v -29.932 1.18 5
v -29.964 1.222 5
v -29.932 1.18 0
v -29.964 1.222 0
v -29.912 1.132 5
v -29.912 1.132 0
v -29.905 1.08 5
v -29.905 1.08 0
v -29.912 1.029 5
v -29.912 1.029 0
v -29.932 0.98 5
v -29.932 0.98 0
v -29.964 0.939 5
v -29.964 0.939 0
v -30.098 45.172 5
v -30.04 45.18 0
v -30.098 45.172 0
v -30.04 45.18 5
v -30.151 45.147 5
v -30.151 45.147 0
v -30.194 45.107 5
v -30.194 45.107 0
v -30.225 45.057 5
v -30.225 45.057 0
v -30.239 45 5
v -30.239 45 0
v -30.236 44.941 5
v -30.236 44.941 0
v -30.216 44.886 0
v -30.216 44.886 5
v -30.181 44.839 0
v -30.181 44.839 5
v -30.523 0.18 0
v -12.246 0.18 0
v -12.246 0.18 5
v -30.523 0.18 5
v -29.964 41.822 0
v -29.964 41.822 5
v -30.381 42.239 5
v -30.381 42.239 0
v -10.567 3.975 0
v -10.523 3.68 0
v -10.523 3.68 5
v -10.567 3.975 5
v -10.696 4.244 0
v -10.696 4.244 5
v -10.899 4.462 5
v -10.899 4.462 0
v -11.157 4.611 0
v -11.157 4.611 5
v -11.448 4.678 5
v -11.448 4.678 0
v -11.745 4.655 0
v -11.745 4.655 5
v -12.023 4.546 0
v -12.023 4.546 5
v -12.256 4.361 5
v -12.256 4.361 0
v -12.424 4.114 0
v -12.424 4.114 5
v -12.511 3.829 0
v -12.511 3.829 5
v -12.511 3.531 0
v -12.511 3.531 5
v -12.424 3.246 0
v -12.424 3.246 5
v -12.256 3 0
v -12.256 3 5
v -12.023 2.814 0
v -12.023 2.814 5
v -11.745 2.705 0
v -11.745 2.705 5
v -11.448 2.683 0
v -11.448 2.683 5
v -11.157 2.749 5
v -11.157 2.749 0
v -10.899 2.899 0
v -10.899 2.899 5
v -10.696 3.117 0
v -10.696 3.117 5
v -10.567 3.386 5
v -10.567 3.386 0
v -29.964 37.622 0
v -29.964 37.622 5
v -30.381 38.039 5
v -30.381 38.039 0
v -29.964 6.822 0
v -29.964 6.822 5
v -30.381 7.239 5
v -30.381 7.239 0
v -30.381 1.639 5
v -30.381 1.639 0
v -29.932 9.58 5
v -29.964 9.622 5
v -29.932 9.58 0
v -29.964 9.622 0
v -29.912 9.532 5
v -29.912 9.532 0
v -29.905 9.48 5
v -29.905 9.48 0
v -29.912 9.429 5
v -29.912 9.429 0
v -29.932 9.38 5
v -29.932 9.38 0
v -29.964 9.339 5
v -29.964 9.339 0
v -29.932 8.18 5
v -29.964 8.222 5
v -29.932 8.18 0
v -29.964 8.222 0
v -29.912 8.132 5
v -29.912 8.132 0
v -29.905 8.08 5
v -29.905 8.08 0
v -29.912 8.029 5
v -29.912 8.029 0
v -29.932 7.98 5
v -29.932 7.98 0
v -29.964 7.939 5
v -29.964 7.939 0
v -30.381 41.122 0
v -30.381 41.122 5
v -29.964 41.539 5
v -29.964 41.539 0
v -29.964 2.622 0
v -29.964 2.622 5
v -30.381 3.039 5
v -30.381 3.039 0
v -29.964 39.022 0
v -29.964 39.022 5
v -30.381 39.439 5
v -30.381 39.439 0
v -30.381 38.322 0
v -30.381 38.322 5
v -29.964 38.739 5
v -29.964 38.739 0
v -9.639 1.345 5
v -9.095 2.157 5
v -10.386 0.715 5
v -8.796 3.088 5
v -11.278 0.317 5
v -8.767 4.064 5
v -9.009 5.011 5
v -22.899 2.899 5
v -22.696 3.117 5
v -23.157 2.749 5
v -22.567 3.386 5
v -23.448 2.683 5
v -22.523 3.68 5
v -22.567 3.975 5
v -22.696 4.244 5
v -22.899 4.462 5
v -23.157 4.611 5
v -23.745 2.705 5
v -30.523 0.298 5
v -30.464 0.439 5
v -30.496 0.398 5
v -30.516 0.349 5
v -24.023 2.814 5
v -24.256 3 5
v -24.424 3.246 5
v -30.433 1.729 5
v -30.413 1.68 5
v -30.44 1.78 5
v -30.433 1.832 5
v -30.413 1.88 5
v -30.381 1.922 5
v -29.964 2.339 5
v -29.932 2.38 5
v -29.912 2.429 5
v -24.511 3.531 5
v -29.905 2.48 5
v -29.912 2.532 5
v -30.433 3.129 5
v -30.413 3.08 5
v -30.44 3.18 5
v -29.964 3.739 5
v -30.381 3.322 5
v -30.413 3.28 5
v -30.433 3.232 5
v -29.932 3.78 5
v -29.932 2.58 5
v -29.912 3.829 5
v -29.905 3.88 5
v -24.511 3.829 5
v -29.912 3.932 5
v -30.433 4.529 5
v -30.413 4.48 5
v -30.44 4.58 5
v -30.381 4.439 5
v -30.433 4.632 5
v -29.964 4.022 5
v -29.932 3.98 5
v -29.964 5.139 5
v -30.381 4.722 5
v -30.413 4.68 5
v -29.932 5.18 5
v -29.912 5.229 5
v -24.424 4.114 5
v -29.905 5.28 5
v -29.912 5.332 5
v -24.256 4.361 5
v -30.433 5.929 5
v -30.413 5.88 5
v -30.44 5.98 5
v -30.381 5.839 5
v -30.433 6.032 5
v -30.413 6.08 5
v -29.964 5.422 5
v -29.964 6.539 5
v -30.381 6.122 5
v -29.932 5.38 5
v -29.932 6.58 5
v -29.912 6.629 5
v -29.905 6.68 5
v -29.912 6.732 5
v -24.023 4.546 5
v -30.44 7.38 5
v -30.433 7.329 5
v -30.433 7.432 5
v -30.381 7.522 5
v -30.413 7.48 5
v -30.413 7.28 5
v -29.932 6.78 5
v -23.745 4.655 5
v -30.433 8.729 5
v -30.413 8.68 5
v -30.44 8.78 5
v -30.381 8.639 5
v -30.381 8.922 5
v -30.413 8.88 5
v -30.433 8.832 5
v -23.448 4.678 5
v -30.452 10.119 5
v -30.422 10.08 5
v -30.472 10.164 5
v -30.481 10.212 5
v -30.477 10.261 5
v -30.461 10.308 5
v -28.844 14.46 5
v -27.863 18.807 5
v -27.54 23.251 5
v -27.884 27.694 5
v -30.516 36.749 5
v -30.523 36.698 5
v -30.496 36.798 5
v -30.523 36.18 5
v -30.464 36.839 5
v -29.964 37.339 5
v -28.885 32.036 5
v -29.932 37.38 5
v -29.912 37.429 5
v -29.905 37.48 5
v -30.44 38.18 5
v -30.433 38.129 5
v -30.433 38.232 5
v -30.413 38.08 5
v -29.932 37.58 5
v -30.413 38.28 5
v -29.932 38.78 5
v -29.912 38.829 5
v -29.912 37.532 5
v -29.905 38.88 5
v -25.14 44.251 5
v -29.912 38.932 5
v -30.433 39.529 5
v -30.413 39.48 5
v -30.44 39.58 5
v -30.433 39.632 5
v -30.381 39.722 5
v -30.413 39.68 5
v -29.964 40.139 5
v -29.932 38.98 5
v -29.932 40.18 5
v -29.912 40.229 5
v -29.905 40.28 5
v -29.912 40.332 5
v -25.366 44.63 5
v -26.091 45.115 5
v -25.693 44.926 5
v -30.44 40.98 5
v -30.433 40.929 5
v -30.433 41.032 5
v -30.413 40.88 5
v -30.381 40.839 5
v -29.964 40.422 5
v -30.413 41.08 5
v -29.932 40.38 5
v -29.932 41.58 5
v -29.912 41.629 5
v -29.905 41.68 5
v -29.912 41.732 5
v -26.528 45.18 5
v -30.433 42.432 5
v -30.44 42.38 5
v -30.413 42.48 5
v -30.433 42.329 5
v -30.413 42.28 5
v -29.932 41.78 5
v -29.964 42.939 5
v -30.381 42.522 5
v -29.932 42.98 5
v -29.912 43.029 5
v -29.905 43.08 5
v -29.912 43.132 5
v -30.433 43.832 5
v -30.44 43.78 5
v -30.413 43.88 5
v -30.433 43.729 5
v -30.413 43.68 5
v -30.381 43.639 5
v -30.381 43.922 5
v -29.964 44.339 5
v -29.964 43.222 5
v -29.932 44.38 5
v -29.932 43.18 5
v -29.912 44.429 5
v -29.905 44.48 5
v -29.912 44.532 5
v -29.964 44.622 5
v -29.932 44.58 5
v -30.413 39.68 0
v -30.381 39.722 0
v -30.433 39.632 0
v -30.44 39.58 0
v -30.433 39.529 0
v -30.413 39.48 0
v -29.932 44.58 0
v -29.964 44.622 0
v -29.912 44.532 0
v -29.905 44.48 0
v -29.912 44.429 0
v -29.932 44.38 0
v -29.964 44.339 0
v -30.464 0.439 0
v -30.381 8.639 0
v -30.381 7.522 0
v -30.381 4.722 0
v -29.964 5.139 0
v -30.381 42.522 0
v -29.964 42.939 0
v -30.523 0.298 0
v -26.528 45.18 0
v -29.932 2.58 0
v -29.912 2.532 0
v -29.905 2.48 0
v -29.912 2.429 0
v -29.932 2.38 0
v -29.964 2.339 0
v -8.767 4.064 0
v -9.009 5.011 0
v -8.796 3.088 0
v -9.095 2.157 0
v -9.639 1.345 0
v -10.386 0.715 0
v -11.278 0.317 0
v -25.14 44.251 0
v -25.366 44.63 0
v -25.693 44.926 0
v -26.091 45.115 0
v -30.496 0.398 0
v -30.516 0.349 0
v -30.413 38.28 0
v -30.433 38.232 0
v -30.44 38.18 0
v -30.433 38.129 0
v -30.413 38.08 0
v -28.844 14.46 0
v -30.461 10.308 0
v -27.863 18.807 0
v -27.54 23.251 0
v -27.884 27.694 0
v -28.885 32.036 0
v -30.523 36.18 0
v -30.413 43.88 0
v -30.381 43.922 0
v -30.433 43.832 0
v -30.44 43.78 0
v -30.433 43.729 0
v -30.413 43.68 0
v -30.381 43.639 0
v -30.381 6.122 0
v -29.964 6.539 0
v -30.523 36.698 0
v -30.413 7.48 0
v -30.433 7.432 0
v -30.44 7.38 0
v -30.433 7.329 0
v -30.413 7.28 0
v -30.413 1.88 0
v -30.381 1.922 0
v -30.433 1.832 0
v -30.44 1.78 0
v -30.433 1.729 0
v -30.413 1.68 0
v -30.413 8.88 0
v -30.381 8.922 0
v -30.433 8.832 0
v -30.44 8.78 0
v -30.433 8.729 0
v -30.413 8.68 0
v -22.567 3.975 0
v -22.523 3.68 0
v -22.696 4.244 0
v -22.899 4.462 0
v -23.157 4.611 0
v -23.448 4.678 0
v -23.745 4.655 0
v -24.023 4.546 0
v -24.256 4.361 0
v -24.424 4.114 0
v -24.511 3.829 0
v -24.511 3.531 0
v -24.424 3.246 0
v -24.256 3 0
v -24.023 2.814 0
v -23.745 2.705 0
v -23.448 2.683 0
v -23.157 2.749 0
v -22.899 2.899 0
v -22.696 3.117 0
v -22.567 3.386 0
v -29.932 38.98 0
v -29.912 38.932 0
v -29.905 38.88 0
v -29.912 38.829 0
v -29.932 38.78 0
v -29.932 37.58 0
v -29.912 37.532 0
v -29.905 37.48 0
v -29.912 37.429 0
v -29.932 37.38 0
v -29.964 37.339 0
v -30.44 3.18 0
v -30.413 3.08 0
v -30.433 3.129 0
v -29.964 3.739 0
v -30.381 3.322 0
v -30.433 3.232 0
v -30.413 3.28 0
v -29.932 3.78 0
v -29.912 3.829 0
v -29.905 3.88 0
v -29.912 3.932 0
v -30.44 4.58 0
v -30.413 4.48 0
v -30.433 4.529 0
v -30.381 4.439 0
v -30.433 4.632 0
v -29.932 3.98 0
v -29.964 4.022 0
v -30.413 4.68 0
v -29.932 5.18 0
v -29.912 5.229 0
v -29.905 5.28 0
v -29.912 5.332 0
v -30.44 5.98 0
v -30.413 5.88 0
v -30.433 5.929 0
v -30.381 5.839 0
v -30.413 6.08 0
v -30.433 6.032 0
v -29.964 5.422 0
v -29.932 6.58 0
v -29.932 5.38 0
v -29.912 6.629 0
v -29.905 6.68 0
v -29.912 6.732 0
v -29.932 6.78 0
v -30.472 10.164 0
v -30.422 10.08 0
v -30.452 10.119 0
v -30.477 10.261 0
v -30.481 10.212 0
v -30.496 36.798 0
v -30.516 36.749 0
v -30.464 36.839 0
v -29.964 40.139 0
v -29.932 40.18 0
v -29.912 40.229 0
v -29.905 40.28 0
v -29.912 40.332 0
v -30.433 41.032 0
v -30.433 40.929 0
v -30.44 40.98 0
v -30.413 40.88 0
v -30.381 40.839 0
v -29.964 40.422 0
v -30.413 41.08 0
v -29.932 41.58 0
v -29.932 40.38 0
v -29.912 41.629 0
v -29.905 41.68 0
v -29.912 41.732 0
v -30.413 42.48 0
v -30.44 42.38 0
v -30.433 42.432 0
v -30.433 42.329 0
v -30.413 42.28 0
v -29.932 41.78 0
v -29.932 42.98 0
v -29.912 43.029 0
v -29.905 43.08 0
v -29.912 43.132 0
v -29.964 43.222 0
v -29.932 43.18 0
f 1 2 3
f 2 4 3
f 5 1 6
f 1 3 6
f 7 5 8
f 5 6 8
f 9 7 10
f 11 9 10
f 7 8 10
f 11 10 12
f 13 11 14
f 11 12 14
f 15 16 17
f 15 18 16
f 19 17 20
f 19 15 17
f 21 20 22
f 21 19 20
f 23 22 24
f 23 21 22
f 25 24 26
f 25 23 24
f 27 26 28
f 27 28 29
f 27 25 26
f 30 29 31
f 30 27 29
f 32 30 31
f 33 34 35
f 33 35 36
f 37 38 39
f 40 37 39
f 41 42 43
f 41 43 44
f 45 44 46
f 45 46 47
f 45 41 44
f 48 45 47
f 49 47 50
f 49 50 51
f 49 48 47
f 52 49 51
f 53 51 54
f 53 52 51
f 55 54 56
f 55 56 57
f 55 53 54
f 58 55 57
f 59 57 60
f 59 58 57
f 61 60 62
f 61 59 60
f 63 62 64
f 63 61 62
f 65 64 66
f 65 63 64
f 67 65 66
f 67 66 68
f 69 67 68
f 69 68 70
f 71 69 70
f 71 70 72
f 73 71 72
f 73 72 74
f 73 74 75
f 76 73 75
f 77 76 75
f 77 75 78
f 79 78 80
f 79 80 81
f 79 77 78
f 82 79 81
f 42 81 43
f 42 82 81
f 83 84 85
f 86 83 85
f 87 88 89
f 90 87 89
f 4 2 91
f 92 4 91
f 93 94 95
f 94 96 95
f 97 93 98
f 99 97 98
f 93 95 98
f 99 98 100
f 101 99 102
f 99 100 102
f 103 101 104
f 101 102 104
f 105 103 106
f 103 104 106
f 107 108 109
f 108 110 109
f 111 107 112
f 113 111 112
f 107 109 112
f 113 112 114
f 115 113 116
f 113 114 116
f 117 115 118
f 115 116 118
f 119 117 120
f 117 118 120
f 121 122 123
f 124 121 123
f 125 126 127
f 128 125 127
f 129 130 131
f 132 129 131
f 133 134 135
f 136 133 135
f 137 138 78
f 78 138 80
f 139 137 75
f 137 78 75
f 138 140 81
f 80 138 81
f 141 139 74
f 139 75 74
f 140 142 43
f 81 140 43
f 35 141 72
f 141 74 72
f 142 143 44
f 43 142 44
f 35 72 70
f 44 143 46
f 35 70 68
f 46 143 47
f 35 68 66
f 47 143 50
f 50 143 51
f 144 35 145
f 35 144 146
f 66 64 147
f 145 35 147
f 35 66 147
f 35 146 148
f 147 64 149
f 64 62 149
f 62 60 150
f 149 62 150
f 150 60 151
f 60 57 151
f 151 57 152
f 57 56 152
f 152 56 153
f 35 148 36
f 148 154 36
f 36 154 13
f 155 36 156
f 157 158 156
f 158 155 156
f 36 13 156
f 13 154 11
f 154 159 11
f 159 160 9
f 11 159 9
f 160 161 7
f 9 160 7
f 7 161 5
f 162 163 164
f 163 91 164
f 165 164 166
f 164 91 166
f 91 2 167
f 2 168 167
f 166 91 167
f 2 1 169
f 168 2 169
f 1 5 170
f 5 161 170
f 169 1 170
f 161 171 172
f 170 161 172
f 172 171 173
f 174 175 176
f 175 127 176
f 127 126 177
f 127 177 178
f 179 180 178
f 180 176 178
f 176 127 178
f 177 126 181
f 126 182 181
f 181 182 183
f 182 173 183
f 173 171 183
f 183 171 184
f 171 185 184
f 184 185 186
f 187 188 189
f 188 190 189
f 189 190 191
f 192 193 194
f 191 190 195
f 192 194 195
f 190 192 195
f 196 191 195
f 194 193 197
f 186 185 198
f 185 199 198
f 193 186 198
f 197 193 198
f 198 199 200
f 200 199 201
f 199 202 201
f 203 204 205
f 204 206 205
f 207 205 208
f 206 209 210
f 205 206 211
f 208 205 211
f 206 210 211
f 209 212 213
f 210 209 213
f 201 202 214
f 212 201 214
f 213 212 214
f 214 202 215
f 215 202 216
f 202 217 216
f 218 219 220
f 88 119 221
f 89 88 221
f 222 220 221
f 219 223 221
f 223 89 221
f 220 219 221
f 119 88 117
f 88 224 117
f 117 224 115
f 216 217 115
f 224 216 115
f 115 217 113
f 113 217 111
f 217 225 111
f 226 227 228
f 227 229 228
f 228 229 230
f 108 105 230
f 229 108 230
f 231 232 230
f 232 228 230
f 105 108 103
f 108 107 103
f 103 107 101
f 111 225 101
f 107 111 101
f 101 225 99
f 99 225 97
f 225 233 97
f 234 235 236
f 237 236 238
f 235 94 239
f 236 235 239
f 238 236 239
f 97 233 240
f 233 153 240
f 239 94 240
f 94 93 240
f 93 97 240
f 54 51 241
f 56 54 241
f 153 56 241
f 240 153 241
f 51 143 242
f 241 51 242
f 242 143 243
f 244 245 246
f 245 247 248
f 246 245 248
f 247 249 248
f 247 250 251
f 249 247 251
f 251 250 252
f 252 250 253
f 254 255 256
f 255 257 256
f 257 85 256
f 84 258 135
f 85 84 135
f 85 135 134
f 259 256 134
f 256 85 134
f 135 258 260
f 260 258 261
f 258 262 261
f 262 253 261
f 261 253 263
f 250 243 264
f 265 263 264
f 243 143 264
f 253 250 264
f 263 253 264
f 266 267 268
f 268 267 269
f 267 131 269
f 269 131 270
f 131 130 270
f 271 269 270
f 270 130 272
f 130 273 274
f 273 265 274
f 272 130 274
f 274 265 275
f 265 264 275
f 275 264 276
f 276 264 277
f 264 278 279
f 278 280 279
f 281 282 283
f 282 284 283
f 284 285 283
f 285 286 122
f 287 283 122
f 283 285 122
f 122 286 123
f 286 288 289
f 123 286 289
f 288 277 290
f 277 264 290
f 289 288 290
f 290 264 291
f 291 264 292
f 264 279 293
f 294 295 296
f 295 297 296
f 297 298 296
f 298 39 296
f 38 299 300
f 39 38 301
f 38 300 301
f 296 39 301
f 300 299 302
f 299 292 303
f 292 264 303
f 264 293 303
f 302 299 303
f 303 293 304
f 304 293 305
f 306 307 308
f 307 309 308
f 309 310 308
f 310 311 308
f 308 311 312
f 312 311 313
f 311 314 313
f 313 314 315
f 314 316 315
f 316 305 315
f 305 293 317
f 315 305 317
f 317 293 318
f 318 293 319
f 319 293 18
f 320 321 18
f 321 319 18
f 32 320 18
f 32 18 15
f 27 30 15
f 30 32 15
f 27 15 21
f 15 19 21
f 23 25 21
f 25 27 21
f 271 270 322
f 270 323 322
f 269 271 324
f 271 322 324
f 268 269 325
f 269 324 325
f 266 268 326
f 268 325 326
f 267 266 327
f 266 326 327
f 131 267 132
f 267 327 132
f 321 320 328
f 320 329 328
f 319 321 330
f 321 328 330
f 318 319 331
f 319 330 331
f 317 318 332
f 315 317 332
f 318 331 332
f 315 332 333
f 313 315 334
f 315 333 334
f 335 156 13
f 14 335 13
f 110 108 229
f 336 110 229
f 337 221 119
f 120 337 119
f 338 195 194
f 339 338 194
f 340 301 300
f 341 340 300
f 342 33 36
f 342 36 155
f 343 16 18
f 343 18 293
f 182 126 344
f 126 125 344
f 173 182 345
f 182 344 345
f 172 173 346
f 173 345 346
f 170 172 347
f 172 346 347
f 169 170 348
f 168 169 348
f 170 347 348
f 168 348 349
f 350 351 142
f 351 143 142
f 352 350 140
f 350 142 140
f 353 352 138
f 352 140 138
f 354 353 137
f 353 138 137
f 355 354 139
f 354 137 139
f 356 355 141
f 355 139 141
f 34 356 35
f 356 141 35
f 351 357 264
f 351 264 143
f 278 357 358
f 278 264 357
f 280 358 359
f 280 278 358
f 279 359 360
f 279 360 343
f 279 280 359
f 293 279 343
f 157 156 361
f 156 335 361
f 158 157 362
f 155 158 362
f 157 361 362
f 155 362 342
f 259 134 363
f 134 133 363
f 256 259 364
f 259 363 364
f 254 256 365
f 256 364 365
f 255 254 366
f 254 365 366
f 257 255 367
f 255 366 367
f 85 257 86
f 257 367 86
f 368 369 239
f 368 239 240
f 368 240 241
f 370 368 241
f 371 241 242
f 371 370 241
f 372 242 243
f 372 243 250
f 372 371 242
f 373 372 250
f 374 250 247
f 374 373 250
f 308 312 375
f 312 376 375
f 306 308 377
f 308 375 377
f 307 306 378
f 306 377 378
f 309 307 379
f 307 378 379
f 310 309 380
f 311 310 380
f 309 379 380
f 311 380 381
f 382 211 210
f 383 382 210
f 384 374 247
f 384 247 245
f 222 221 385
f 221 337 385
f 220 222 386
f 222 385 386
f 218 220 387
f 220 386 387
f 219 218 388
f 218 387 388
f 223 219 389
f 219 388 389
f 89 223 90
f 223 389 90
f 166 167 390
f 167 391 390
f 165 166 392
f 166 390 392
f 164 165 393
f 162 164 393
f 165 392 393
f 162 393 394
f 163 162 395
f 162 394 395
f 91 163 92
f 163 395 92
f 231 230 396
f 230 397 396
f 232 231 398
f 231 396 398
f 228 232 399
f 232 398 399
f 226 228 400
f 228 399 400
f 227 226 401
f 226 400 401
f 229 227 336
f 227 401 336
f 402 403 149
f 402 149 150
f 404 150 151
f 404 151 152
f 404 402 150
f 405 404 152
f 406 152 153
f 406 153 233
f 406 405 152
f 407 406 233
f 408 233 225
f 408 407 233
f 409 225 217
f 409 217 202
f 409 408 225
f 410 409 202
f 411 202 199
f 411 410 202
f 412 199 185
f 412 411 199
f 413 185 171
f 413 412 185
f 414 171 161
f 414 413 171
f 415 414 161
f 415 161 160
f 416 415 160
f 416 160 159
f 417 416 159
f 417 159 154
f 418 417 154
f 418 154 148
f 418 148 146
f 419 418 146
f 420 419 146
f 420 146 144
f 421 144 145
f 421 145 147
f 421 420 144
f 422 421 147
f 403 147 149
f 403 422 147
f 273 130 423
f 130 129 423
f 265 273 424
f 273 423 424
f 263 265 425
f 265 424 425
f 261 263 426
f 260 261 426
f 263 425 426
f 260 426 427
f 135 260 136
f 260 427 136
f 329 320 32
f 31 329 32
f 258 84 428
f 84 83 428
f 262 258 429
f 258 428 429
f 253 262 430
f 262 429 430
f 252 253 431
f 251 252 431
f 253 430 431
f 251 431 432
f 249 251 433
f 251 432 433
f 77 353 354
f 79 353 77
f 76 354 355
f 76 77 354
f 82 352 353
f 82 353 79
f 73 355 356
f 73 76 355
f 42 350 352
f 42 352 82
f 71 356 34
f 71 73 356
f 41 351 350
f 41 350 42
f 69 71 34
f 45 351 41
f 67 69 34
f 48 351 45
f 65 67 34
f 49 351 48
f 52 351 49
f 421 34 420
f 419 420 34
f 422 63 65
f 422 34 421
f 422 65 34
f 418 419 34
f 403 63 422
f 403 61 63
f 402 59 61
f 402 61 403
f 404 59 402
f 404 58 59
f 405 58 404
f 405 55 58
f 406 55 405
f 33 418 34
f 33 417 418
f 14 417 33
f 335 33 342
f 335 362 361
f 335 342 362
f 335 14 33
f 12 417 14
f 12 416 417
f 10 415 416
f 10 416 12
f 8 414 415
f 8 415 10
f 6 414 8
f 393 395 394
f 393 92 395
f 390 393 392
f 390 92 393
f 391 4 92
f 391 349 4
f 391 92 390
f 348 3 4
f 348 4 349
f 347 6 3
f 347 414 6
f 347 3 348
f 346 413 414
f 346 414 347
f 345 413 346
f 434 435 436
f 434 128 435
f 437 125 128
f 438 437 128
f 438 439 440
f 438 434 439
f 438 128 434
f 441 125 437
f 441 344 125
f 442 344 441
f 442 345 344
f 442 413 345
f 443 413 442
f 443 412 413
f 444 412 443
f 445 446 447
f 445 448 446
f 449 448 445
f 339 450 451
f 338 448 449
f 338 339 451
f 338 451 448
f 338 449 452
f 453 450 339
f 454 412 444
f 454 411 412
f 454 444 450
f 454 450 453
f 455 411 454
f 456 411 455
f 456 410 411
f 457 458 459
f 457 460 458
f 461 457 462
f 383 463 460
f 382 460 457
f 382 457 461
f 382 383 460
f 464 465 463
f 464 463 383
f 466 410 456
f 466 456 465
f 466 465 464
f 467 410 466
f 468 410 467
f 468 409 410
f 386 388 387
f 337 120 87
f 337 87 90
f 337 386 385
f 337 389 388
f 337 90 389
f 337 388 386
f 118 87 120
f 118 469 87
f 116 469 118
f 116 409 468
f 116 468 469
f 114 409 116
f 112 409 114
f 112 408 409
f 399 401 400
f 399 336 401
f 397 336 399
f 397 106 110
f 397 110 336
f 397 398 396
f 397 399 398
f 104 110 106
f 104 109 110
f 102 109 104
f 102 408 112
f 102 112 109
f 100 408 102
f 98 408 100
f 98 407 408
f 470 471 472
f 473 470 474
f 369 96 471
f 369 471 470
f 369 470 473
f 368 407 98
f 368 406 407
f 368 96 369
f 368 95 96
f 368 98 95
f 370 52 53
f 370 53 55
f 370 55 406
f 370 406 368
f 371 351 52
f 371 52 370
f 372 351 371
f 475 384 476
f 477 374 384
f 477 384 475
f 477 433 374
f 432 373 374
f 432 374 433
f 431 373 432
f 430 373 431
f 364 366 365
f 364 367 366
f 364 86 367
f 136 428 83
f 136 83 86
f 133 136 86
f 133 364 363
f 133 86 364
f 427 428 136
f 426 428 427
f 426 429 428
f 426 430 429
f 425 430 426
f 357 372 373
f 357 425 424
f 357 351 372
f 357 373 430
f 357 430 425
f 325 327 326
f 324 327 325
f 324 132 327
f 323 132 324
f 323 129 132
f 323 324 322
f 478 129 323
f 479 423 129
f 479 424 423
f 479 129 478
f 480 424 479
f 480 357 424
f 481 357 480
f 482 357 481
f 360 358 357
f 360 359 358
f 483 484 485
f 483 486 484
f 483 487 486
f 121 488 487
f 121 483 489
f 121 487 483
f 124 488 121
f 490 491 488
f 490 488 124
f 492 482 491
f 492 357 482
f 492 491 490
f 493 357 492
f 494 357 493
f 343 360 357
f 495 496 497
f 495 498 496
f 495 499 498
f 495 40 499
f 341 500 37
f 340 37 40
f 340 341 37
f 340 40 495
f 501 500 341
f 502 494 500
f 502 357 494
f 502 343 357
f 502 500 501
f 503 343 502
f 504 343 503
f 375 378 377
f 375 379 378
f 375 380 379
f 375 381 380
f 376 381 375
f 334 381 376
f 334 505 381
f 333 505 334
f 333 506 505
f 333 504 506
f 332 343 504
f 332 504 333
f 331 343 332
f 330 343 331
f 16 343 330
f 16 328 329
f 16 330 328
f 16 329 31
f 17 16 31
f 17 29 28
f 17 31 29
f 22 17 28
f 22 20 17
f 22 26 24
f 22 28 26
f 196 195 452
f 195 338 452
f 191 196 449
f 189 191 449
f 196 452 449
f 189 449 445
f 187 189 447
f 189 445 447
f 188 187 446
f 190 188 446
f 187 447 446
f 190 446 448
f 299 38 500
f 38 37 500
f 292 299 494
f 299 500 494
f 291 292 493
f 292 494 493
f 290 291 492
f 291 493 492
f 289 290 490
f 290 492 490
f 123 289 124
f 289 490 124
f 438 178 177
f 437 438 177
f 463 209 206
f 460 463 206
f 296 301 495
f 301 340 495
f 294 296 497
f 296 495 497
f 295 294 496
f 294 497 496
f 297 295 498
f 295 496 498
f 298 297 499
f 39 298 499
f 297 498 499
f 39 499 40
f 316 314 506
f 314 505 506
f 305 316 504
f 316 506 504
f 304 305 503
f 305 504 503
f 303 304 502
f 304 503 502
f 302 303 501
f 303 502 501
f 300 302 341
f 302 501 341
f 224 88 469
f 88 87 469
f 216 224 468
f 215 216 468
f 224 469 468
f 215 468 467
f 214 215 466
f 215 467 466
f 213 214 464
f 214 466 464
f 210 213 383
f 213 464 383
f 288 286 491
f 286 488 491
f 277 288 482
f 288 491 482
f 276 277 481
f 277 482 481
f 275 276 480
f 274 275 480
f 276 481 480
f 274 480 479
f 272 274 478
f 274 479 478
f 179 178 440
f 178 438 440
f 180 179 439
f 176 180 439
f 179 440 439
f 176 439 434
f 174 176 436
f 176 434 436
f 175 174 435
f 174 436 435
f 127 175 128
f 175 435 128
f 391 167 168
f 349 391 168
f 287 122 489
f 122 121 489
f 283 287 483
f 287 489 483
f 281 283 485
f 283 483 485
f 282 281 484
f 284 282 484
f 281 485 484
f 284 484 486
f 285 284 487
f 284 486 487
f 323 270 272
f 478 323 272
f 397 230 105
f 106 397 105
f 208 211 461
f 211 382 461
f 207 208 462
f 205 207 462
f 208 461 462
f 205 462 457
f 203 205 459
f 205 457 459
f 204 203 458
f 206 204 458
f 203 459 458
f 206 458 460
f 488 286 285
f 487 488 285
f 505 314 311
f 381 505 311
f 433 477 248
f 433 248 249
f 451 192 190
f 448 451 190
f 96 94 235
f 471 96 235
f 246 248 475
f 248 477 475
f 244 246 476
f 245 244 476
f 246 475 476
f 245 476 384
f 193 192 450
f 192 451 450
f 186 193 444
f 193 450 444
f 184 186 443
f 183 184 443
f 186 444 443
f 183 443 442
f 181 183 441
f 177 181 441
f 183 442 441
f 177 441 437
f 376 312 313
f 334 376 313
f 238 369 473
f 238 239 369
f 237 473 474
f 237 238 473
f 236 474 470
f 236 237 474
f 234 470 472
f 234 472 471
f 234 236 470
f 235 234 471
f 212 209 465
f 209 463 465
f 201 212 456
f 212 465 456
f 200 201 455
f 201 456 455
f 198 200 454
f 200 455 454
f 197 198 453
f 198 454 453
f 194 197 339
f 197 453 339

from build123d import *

# Parameters (mm, degrees)
SKETCH1_R      = 1
EXTRUDE2_DEPTH = 5
FILLET2_R      = 3.5
FILLET3_R      = 1.5
EXTRUDE4_DEPTH = 5
FILLET4_R      = 0.2
EXTRUDE5_DEPTH = 5
FILLET5_R      = 0.2


with BuildPart() as part:
    # Sketch1 → Extrude2 (new body)
    with BuildSketch(Plane.XY):
        with BuildLine():
            Line((-30.522603834, 36.180351438), (-30.522603834, 45.180351438))
            Line((-30.522603834, 45.180351438), (-25.522603834, 45.180351438))
            Line((-25.522603834, 45.180351438), (-7.022603834, 0.180351438))
            Line((-7.022603834, 0.180351438), (-30.522603834, 0.180351438))
            Line((-30.522603834, 0.180351438), (-30.522603834, 10.180351438))
            ThreePointArc((-30.522603834, 10.180351438), (-27.540232283, 23.180351438), (-30.522603834, 36.180351438))
        make_face()
        with Locations((-23.522603834, 3.680351438)):
            Circle(SKETCH1_R, mode=Mode.SUBTRACT)
        with Locations((-11.522603834, 3.680351438)):
            Circle(SKETCH1_R, mode=Mode.SUBTRACT)
    extrude(amount=EXTRUDE2_DEPTH)

    # Fillet2
    fillet2_edges = [part.edges().sort_by_distance(p)[0] for p in [
        (-7.022603834, 0.180351438, 2.5),
    ]]
    fillet(fillet2_edges, radius=FILLET2_R)

    # Fillet3
    fillet3_edges = [part.edges().sort_by_distance(p)[0] for p in [
        (-25.522603834, 45.180351438, 2.5),
    ]]
    fillet(fillet3_edges, radius=FILLET3_R)

    # Sketch3 → Extrude4 (cut)
    with BuildSketch(Plane.XY.offset(5)):
        Polygon((-29.822603834, 43.080351438), (-30.522603834, 43.780351438), (-30.522603834, 42.380351438), align=None)
        Polygon((-29.822603834, 44.480351438), (-30.522603834, 45.180351438), (-30.522603834, 43.780351438), align=None)
        Polygon((-29.822603834, 41.680351438), (-30.522603834, 42.380351438), (-30.522603834, 40.980351438), align=None)
        Polygon((-29.822603834, 40.280351438), (-30.522603834, 40.980351438), (-30.522603834, 39.580351438), align=None)
        Polygon((-29.822603834, 38.880351438), (-30.522603834, 39.580351438), (-30.522603834, 38.180351438), align=None)
        Polygon((-29.822603834, 37.480351438), (-30.522603834, 38.180351438), (-30.522603834, 36.780351438), align=None)
    extrude(amount=-EXTRUDE4_DEPTH, mode=Mode.SUBTRACT)

    # Fillet4
    fillet4_edges = [part.edges().sort_by_distance(p)[0] for p in [
        (-30.522603834, 45.180351438, 2.5),
        (-29.822603834, 43.080351438, 2.5),
        (-30.522603834, 42.380351438, 2.5),
        (-30.522603834, 43.780351438, 2.5),
        (-29.822603834, 44.480351438, 2.5),
        (-29.822603834, 41.680351438, 2.5),
        (-30.522603834, 40.980351438, 2.5),
        (-29.822603834, 40.280351438, 2.5),
        (-30.522603834, 39.580351438, 2.5),
        (-29.822603834, 38.880351438, 2.5),
        (-30.522603834, 38.180351438, 2.5),
        (-29.822603834, 37.480351438, 2.5),
        (-30.522603834, 36.780351438, 2.5),
    ]]
    fillet(fillet4_edges, radius=FILLET4_R)

    # Sketch4 → Extrude5 (cut)
    with BuildSketch(Plane.XY.offset(5)):
        Polygon((-29.822603834, 1.080351438), (-30.522603834, 1.780351438), (-30.522603834, 0.380351438), align=None)
        Polygon((-29.822603834, 2.480351438), (-30.522603834, 3.180351438), (-30.522603834, 1.780351438), align=None)
        Polygon((-29.822603834, 3.880351438), (-30.522603834, 4.580351438), (-30.522603834, 3.180351438), align=None)
        Polygon((-29.822603834, 5.280351438), (-30.522603834, 5.980351438), (-30.522603834, 4.580351438), align=None)
        Polygon((-29.822603834, 6.680351438), (-30.522603834, 7.380351438), (-30.522603834, 5.980351438), align=None)
        Polygon((-29.822603834, 8.080351438), (-30.522603834, 8.780351438), (-30.522603834, 7.380351438), align=None)
        Polygon((-29.822603834, 9.480351438), (-30.522603834, 10.180351438), (-30.522603834, 8.780351438), align=None)
    extrude(amount=-EXTRUDE5_DEPTH, mode=Mode.SUBTRACT)

    # Fillet5
    fillet5_edges = [part.edges().sort_by_distance(p)[0] for p in [
        (-30.522603834, 10.180351438, 2.5),
        (-29.822603834, 2.480351438, 2.5),
        (-30.522603834, 1.780351438, 2.5),
        (-29.822603834, 3.880351438, 2.5),
        (-30.522603834, 3.180351438, 2.5),
        (-29.822603834, 5.280351438, 2.5),
        (-30.522603834, 4.580351438, 2.5),
        (-29.822603834, 6.680351438, 2.5),
        (-30.522603834, 5.980351438, 2.5),
        (-29.822603834, 8.080351438, 2.5),
        (-30.522603834, 7.380351438, 2.5),
        (-29.822603834, 9.480351438, 2.5),
        (-30.522603834, 8.780351438, 2.5),
        (-29.822603834, 1.080351438, 2.5),
        (-30.522603834, 0.380351438, 2.5),
    ]]
    fillet(fillet5_edges, radius=FILLET5_R)


solid = part.part
